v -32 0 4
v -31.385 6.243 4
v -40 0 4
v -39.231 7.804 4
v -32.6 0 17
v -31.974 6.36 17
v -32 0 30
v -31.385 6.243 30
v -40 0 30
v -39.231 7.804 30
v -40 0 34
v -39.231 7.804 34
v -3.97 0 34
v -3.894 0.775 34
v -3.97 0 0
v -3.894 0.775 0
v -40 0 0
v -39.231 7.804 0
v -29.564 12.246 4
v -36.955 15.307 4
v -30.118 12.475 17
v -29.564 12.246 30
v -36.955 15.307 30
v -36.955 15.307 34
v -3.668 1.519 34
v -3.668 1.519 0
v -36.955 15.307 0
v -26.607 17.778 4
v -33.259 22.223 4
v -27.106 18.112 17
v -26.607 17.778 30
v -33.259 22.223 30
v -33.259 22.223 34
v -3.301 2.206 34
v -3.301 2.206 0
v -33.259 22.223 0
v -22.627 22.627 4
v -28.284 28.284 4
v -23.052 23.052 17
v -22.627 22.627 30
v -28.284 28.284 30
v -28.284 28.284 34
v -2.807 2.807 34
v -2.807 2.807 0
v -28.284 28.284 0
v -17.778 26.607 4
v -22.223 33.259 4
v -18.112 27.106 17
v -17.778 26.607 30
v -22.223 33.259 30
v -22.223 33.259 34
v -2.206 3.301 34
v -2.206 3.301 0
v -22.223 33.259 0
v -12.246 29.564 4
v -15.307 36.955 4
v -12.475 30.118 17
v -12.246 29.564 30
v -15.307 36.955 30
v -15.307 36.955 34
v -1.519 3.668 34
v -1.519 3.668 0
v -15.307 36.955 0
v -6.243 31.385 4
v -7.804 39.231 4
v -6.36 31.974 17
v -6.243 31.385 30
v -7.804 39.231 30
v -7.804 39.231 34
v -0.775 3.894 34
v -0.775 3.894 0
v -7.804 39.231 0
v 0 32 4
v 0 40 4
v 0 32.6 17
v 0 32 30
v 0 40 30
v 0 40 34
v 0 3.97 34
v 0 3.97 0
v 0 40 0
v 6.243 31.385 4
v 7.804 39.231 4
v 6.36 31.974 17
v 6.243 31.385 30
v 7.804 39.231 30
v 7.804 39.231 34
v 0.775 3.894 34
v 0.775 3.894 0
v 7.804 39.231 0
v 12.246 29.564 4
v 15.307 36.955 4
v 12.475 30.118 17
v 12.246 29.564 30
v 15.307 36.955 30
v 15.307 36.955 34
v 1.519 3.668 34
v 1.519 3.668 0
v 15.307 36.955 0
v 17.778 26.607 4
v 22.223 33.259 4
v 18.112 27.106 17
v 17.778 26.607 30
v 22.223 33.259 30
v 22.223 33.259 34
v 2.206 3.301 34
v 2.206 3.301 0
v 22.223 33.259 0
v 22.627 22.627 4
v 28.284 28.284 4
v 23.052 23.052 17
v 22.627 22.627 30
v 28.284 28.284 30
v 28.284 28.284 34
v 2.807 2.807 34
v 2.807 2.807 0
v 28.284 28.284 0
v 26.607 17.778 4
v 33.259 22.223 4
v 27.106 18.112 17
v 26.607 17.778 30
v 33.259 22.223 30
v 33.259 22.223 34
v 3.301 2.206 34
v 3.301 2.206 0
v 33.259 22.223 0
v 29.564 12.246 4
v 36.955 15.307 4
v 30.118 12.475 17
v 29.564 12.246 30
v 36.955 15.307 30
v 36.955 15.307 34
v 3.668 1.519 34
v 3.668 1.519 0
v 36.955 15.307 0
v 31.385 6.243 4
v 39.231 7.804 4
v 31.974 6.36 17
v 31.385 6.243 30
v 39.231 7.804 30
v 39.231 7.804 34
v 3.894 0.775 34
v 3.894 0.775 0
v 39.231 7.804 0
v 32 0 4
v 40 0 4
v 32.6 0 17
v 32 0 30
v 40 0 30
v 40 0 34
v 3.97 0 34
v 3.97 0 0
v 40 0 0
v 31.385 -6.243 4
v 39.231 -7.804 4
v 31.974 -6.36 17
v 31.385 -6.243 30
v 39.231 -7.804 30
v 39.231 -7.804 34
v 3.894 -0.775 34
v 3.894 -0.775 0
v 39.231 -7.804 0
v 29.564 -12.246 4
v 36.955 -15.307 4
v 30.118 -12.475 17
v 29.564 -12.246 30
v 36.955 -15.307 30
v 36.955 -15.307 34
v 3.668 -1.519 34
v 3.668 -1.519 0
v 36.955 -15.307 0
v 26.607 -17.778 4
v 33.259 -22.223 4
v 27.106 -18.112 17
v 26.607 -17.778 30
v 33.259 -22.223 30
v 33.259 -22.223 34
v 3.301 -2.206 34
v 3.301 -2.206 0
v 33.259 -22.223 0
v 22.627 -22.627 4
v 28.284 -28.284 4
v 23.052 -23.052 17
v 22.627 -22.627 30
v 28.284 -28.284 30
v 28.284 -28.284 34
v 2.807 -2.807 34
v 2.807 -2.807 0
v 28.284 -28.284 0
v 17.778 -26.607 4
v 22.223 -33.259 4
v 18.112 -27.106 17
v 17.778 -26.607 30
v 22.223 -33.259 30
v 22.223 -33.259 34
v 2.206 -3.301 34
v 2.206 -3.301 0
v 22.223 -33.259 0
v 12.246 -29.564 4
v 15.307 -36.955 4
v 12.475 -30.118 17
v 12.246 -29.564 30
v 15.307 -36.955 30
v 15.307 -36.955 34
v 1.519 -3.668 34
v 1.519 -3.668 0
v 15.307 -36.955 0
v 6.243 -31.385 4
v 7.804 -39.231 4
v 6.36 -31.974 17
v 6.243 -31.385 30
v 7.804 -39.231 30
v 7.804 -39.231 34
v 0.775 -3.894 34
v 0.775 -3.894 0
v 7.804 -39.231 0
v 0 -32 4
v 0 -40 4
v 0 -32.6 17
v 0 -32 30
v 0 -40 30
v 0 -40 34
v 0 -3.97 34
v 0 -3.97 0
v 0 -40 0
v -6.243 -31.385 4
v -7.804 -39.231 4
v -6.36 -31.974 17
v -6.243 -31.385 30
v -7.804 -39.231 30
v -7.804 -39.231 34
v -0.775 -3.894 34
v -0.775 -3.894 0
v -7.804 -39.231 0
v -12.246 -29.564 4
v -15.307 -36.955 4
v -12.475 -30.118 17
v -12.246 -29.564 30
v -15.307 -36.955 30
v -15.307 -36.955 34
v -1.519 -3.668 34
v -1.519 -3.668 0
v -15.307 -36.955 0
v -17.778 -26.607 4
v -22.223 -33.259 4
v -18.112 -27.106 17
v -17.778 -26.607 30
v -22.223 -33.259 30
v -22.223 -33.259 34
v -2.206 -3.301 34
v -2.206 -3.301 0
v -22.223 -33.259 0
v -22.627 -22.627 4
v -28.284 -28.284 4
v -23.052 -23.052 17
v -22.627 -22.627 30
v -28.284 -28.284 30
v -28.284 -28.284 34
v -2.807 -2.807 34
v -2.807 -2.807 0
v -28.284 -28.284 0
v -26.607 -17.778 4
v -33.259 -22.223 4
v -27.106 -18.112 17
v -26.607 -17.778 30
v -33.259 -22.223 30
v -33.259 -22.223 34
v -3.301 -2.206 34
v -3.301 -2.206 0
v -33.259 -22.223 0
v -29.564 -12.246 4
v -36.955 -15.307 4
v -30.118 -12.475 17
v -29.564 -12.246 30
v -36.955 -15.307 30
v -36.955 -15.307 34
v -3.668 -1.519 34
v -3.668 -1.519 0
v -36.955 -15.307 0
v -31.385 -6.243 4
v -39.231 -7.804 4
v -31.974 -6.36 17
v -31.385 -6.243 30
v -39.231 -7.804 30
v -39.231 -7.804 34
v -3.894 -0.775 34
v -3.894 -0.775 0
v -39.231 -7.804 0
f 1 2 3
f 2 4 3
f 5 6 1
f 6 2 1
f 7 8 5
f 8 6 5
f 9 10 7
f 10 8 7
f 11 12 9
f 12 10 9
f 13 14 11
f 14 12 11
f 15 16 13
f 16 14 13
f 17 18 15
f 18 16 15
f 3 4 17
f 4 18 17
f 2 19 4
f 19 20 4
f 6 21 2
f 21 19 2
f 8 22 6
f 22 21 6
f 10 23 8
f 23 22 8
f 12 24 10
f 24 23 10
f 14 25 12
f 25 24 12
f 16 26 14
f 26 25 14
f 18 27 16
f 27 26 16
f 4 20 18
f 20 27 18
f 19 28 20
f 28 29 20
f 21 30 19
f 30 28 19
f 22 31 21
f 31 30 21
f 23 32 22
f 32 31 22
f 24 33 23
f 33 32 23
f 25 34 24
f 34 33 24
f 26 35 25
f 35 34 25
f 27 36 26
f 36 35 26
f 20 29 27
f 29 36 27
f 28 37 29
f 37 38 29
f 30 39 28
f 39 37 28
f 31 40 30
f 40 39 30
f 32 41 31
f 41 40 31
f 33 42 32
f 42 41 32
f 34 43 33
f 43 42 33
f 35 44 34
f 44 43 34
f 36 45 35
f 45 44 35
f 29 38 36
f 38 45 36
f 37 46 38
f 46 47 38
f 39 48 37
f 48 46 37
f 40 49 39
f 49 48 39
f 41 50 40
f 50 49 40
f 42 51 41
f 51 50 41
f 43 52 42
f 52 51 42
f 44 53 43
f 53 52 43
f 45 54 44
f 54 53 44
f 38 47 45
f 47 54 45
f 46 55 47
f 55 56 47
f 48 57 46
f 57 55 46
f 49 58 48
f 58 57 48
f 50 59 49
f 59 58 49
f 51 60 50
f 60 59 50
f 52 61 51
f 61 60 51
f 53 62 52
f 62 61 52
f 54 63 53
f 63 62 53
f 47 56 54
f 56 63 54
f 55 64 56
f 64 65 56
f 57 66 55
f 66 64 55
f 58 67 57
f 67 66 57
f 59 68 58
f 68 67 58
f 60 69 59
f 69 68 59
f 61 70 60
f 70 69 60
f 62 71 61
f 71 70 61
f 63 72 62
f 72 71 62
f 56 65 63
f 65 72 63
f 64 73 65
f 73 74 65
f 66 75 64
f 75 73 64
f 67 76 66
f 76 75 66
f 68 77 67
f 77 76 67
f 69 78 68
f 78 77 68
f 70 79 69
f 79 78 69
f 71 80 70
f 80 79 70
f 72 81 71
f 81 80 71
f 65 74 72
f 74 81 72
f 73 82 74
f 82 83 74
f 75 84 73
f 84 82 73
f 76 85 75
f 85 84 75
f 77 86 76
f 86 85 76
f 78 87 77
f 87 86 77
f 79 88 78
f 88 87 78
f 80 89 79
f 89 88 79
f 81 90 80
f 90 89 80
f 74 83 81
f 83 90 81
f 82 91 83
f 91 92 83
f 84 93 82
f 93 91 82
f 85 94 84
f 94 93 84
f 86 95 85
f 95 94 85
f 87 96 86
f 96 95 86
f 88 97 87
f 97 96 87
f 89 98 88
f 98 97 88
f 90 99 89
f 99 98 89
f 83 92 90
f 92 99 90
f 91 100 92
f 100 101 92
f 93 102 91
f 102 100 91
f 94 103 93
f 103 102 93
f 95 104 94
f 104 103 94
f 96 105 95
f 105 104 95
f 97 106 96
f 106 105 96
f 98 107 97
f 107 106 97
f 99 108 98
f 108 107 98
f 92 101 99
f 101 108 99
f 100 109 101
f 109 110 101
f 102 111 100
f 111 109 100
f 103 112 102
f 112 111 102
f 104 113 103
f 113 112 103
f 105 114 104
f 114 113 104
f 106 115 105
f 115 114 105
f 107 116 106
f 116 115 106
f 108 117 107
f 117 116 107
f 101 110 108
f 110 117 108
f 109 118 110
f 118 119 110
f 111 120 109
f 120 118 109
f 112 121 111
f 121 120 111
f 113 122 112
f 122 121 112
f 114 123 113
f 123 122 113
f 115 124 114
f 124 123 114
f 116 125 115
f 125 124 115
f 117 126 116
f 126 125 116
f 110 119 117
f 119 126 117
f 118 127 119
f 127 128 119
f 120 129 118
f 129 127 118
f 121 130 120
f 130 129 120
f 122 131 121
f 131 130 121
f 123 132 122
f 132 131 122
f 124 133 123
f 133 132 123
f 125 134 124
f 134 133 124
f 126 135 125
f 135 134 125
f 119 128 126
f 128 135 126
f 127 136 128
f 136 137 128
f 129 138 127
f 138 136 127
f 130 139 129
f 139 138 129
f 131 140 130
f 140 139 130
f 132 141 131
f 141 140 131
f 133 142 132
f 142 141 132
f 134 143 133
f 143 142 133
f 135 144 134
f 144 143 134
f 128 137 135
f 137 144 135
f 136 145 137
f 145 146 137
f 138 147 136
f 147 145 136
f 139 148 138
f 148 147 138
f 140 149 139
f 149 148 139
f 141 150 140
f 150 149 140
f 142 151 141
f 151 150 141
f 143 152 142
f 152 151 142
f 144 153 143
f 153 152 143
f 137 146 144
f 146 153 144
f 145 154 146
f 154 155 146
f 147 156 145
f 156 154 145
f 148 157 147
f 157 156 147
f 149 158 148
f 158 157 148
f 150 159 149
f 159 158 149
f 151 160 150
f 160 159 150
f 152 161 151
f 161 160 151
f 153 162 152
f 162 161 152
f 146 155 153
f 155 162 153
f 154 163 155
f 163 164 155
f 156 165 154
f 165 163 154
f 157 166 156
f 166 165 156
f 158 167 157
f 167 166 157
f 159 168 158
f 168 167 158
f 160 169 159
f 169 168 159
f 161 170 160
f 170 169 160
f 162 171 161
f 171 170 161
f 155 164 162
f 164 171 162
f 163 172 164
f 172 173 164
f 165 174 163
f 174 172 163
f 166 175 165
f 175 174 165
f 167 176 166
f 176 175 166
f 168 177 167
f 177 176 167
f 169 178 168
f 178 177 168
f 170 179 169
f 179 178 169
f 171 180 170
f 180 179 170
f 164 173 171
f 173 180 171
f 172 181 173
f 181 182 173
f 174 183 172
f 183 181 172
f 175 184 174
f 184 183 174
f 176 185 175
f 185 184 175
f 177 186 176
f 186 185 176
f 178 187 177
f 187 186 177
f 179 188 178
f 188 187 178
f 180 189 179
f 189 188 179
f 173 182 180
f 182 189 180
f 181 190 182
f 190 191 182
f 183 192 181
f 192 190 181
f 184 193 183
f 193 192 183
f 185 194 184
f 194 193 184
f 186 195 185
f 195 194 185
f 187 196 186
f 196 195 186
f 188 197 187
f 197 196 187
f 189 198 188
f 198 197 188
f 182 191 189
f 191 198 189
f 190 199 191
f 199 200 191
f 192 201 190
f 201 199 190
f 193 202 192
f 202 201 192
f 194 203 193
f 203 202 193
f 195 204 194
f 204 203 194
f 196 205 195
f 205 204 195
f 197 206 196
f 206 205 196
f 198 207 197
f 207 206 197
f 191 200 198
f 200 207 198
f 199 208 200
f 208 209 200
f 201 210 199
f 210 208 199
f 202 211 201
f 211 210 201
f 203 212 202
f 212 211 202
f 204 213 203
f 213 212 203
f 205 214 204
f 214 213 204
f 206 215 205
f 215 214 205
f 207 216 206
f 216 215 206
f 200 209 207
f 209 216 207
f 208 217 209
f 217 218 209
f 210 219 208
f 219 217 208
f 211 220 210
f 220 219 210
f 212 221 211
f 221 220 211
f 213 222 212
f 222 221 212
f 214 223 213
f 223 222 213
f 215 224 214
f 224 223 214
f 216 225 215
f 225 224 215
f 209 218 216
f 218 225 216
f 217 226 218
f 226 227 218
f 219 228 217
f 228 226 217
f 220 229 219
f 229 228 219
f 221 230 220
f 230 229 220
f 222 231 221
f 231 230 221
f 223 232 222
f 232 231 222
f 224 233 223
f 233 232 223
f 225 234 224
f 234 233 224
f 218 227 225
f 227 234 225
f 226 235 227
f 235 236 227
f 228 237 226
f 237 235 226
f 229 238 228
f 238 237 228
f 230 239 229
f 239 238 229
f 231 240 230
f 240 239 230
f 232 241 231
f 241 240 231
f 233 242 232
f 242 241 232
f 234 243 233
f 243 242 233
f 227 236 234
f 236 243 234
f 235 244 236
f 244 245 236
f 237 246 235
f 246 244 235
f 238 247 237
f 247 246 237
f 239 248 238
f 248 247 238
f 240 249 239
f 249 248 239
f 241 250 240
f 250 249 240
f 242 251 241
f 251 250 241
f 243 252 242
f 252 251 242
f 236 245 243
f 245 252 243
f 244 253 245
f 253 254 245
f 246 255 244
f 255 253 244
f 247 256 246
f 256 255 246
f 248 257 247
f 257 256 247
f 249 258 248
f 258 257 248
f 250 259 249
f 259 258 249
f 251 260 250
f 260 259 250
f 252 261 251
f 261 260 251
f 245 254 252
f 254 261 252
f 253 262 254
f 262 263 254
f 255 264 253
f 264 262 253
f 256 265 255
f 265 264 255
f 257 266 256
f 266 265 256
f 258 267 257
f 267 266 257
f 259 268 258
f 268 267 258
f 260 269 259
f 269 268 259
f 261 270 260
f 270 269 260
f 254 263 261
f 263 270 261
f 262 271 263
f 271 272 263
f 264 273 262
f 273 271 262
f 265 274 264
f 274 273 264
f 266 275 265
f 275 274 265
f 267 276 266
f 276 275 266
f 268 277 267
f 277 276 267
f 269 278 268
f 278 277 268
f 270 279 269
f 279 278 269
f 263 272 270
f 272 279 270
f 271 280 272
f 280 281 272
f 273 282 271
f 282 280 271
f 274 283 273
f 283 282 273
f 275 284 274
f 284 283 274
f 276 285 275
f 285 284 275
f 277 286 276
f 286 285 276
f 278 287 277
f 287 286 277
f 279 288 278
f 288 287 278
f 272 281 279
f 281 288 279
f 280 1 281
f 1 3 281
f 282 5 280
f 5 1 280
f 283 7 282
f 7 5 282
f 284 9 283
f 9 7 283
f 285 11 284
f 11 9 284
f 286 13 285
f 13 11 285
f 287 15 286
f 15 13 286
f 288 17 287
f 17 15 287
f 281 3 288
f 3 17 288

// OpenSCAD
$fn = 32;

// ----------------------------------------------------------------------
// Belt roller: 64 mm barrel, 34 mm wide, bore 7.94 mm
// ----------------------------------------------------------------------

// --- parameters (mm) ---
bore_d = 7.94;            // bore
barrel_d = 64;            // barrel diameter
roller_w = 34;            // roller width
flange_d = 80;            // flange diameter
flange_t = 4;             // flange thickness
hub_d = 27.94;            // hub diameter

roller_profile = [[3.97, 0], [40, 0], [40, 4], [32, 4], [32.6, 17], [32, 30], [40, 30], [40, 34], [3.97, 34]];

/* the profile stays clear of the axis, so the bore comes out of the revolve */
rotate_extrude() polygon(roller_profile);
